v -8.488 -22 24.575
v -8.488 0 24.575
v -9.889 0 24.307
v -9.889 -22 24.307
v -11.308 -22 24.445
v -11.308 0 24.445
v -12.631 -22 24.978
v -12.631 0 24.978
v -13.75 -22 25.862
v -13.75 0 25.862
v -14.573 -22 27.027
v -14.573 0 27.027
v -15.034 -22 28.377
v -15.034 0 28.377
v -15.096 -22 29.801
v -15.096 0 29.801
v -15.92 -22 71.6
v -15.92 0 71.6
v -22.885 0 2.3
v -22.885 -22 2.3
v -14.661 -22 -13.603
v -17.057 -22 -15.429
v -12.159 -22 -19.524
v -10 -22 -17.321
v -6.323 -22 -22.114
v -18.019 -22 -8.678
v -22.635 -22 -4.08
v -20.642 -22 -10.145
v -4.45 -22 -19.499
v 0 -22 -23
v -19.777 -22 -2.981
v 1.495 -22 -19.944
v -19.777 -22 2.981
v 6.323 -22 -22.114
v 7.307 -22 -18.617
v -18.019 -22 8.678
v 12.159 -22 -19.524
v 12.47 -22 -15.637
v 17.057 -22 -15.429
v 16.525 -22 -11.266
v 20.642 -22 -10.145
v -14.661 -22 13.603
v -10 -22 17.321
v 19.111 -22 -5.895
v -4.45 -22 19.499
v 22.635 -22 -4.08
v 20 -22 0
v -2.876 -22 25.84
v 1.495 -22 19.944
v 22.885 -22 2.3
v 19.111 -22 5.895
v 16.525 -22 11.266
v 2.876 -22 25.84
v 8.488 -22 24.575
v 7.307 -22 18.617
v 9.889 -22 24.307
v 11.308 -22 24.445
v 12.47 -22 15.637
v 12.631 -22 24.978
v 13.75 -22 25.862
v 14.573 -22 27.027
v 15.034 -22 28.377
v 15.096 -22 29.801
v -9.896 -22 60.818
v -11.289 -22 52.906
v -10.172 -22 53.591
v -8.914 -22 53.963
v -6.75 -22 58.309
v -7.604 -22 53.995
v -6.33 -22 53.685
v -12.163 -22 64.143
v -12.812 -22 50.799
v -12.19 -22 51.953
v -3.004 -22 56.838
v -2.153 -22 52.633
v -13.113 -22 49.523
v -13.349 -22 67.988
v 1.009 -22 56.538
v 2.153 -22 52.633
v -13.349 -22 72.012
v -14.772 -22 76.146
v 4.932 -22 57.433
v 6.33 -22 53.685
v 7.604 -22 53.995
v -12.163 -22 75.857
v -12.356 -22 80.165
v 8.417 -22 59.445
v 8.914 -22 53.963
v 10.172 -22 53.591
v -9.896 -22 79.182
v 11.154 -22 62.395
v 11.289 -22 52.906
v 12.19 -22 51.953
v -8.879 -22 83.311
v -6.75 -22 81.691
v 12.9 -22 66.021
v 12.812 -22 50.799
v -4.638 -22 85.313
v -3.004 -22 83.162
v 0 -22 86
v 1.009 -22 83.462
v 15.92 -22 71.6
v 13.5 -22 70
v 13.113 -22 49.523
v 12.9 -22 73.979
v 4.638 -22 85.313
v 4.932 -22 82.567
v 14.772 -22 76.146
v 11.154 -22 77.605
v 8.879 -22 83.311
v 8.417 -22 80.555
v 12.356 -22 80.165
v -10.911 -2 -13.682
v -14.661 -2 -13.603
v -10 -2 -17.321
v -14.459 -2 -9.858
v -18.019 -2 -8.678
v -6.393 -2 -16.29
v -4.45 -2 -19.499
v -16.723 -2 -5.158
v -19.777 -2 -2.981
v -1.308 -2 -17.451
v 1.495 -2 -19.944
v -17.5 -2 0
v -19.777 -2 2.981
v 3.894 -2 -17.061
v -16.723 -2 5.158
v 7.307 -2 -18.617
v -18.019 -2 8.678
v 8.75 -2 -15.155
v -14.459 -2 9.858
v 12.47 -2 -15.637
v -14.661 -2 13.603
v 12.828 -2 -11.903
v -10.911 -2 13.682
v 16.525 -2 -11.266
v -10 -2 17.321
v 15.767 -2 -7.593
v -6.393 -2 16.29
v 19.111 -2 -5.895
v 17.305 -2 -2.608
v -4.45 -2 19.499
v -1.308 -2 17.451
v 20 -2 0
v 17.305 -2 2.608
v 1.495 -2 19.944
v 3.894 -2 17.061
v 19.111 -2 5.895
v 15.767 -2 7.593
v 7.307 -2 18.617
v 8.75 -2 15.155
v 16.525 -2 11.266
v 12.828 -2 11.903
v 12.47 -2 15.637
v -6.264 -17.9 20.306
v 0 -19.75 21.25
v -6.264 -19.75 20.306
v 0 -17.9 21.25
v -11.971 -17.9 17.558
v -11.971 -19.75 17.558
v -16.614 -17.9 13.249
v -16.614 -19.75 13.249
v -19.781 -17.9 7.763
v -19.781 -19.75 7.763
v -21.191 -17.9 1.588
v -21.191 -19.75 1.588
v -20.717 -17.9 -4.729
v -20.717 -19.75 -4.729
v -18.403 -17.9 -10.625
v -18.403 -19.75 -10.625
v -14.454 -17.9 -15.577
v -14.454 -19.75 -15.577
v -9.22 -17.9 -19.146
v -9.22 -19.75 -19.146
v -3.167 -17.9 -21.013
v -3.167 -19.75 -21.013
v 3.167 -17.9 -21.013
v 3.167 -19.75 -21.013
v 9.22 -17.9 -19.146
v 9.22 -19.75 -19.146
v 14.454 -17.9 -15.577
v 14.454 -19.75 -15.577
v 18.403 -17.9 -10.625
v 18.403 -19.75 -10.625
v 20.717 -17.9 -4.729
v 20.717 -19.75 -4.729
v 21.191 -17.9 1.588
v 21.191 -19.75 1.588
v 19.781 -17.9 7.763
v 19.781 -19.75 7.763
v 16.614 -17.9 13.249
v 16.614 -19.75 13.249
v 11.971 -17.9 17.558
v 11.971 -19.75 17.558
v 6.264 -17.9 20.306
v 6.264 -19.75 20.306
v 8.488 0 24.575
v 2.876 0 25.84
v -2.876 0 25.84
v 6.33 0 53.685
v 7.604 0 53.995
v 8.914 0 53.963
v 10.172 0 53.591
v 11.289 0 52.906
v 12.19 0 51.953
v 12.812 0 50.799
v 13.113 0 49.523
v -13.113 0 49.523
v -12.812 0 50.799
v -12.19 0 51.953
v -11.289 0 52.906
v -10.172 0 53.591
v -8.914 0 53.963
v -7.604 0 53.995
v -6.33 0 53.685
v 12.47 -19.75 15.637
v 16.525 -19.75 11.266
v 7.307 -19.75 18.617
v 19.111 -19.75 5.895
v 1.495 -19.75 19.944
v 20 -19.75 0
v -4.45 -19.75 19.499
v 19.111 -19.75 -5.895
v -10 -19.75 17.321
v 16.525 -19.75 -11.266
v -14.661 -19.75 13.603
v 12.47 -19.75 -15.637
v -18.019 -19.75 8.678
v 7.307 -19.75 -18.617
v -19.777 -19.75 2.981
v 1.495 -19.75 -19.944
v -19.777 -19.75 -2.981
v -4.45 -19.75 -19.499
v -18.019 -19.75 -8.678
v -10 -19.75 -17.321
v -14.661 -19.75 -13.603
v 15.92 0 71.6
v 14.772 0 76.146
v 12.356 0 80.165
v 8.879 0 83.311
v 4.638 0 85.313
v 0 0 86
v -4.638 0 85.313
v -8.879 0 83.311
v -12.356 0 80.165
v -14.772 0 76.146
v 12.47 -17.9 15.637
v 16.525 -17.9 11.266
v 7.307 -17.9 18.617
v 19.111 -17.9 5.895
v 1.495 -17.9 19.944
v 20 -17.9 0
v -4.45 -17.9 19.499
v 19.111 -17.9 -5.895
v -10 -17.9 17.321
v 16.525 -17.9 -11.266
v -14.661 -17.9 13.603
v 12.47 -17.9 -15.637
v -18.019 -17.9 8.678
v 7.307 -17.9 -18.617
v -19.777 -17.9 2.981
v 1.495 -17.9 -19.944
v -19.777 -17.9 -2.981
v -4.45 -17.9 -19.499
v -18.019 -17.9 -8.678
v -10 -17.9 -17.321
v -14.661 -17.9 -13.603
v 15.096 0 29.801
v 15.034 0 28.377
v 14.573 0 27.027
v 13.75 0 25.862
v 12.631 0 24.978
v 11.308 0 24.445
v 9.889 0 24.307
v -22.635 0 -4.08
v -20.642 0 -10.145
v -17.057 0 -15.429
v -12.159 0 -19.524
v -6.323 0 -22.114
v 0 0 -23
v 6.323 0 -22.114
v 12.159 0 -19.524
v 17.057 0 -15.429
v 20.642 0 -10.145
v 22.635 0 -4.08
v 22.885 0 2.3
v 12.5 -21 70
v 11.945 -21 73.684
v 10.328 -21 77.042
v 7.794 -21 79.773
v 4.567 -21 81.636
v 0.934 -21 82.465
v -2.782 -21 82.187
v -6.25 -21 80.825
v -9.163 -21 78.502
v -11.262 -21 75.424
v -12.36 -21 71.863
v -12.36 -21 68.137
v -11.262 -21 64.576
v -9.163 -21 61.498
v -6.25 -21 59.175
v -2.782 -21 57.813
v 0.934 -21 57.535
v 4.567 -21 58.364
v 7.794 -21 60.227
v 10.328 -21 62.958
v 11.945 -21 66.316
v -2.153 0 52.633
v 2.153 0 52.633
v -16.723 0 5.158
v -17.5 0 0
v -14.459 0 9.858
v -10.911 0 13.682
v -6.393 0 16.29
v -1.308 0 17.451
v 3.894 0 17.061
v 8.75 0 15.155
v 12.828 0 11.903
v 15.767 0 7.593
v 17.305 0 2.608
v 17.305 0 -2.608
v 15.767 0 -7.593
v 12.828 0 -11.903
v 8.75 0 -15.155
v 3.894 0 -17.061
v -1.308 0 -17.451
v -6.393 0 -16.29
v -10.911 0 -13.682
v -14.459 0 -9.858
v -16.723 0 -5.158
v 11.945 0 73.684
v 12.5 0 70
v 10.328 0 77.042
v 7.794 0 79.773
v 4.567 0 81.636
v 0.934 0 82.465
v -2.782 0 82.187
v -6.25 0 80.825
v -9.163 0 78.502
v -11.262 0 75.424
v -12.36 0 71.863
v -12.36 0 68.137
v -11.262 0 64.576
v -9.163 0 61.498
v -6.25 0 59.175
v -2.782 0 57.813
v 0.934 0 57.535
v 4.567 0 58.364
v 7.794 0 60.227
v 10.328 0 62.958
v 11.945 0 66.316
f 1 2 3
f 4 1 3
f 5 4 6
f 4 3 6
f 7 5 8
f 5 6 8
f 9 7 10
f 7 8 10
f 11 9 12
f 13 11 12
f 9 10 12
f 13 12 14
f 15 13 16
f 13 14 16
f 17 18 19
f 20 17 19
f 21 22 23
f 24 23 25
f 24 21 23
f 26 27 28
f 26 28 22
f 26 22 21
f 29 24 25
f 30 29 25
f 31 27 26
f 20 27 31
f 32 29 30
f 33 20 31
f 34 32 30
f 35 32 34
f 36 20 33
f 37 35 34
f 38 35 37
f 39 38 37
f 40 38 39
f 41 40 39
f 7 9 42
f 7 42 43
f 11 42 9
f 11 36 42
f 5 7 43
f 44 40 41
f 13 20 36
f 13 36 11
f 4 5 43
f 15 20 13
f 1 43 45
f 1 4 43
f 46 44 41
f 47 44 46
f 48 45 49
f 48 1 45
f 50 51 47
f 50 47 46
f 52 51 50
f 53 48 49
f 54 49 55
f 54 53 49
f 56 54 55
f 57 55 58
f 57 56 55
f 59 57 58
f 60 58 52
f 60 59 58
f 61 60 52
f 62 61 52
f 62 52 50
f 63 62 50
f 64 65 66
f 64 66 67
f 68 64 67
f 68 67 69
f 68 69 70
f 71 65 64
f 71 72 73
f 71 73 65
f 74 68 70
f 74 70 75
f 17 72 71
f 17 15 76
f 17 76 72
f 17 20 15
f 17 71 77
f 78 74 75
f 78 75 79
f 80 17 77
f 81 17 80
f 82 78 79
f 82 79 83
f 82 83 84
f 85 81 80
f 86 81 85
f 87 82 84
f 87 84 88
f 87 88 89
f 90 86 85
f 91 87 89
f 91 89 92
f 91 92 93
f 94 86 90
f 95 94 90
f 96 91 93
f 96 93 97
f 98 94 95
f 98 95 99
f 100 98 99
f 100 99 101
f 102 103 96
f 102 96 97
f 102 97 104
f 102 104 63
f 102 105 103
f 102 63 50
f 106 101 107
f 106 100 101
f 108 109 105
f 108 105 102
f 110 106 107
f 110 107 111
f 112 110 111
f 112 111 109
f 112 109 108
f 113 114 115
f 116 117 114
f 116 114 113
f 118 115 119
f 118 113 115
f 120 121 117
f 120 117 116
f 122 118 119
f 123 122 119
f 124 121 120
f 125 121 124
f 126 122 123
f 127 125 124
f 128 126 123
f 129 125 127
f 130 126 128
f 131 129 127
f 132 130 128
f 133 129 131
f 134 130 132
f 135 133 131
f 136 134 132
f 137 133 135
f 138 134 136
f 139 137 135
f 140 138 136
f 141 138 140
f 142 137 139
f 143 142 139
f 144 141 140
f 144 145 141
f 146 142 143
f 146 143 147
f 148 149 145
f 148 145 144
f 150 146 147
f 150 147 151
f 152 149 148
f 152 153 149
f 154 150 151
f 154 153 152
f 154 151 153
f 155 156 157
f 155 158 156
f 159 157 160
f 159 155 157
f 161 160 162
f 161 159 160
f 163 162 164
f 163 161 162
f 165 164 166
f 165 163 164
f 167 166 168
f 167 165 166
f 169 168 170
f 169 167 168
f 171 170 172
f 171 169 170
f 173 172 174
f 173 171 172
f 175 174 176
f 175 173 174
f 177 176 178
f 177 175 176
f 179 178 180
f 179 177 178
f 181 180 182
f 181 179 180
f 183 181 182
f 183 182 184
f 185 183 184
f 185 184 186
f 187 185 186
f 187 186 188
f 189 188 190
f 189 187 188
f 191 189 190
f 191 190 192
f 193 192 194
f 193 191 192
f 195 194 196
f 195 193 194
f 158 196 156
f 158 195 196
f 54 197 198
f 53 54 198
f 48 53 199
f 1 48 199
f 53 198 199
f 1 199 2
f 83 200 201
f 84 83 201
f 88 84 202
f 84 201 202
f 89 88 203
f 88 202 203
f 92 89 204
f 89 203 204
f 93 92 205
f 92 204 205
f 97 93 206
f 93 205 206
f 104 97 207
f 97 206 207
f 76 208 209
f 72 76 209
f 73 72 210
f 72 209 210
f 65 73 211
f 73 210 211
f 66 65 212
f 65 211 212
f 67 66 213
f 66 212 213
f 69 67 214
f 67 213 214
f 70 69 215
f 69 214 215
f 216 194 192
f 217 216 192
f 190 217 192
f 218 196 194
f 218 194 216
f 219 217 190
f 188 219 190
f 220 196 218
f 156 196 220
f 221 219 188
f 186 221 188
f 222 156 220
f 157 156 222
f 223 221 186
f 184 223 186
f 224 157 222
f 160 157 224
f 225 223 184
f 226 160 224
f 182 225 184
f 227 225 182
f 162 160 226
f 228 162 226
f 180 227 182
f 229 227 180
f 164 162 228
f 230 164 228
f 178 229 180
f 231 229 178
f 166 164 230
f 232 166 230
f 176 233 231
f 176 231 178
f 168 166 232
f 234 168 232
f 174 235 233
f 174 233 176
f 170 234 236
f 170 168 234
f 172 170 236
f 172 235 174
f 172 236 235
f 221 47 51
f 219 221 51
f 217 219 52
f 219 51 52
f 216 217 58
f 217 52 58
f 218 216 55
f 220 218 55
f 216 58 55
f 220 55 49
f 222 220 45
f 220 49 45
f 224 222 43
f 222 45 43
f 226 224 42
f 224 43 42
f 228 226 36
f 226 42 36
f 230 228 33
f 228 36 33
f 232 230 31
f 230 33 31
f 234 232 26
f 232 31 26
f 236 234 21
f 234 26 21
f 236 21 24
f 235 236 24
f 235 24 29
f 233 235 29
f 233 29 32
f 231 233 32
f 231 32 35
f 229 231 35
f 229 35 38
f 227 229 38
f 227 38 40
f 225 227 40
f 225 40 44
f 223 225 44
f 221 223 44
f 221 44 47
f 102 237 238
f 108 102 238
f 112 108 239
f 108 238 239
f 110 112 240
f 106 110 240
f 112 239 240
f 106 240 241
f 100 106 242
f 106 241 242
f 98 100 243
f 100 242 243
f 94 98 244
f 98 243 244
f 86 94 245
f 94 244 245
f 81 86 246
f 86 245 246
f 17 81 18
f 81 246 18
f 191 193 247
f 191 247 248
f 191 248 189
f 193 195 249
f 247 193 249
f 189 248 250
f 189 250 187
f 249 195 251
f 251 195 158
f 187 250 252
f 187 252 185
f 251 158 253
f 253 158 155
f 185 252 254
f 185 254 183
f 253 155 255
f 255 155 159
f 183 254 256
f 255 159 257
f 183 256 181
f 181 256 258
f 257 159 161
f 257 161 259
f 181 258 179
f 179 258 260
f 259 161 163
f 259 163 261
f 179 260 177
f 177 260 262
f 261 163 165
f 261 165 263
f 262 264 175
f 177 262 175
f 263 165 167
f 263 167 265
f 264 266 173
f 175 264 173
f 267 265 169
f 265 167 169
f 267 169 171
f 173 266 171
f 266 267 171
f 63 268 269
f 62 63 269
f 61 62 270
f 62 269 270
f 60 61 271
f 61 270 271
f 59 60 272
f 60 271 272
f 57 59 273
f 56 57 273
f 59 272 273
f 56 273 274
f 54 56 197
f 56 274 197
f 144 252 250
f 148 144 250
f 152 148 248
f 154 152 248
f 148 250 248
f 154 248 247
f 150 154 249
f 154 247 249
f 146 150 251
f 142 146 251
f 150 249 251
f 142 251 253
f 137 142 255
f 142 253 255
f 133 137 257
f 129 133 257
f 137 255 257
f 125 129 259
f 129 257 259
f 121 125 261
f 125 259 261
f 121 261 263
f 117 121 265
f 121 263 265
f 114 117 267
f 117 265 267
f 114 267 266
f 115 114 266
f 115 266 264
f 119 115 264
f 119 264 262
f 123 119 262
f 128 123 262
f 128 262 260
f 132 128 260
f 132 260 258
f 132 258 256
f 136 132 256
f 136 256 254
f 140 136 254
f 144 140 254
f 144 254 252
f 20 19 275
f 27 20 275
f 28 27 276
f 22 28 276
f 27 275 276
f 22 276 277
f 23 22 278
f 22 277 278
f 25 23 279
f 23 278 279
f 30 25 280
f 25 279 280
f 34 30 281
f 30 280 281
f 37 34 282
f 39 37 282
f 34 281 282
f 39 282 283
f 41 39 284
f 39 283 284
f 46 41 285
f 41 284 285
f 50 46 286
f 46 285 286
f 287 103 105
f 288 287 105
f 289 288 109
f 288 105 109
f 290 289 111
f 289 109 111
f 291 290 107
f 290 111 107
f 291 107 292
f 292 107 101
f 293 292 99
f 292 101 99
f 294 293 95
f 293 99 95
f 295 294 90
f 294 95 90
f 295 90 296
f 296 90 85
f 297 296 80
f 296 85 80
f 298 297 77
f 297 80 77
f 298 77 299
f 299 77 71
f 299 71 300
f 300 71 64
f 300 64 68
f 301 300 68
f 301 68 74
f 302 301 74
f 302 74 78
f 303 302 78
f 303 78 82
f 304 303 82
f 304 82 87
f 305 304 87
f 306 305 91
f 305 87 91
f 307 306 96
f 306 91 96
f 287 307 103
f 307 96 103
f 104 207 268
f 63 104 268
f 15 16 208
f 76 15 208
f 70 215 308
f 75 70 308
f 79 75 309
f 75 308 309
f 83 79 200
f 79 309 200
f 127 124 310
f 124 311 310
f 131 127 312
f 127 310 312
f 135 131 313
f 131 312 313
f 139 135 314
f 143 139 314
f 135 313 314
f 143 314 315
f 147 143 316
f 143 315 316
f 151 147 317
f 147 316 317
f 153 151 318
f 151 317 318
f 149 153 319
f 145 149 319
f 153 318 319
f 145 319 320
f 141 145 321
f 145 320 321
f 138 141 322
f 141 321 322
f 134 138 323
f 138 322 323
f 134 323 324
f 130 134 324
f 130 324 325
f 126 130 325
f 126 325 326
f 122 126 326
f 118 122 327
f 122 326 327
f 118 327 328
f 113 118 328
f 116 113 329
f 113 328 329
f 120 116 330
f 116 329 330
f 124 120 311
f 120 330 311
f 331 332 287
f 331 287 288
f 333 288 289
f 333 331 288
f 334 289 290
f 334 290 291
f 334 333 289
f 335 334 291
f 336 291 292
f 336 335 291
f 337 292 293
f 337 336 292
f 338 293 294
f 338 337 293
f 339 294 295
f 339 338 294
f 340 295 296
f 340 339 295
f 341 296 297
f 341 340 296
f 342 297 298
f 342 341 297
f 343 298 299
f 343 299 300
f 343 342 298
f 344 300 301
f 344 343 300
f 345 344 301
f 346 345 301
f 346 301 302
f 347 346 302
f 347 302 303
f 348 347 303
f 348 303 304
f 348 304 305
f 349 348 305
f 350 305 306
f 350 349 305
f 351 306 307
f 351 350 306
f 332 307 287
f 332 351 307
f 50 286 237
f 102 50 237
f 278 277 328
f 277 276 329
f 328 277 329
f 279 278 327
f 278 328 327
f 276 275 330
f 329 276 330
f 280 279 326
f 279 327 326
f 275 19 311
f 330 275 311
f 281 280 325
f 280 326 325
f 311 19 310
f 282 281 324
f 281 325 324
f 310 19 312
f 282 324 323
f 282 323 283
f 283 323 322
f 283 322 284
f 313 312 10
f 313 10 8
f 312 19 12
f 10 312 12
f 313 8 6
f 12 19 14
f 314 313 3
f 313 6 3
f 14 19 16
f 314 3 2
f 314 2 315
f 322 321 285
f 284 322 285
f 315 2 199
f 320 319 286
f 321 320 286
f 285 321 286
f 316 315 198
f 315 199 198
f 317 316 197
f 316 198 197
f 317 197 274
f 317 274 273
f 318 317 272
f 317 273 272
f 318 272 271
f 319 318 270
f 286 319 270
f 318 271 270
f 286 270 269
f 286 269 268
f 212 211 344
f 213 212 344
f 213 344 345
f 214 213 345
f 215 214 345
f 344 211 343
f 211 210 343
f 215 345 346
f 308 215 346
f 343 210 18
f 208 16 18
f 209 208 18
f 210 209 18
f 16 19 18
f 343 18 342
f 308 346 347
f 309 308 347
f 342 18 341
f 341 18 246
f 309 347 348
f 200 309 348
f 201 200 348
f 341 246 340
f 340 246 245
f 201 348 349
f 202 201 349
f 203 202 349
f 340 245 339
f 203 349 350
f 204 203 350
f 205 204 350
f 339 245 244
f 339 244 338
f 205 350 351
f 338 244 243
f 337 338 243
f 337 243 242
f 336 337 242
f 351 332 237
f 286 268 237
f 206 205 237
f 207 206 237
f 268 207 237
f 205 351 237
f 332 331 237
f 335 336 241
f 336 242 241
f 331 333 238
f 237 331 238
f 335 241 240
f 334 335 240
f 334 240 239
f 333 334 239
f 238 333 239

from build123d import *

# Parameters (mm, degrees)
F0_R           = 12.5
F1_DEPTH       = 22
F2_SIZE        = 1
F4_D           = 35
F4_CBORE_D     = 40
F4_CBORE_DEPTH = 20
F5_W           = 1.85
F5_H           = 21.25


with BuildPart() as f1:
    # F0 (on Front) → F1 (new body)
    with BuildSketch(Plane.XZ):
        with BuildLine():
            Line((-15.919799, 71.6), (-22.884711, 2.3))
            ThreePointArc((-22.884711, 2.3), (0, -23), (22.884711, 2.3))
            Line((22.884711, 2.3), (15.919799, 71.6))
            ThreePointArc((15.919799, 71.6), (0, 86), (-15.919799, 71.6))
        make_face()
        with BuildLine():
            ThreePointArc((-13.113387, 49.52345), (-10.753012, 53.285382), (-6.329905, 53.684906))
            ThreePointArc((-6.329905, 53.684906), (0, 52.5), (6.329905, 53.684906))
            ThreePointArc((6.329905, 53.684906), (10.753012, 53.285382), (13.113387, 49.52345))
            Line((13.113387, 49.52345), (15.095524, 29.801429))
            ThreePointArc((15.095524, 29.801429), (13.222374, 25.379832), (8.488234, 24.575392))
            ThreePointArc((8.488234, 24.575392), (0, 26), (-8.488234, 24.575392))
            ThreePointArc((-8.488234, 24.575392), (-13.222374, 25.379832), (-15.095524, 29.801429))
            Line((-15.095524, 29.801429), (-13.113387, 49.52345))
        make_face(mode=Mode.SUBTRACT)
        with Locations((0, 70)):
            Circle(F0_R, mode=Mode.SUBTRACT)
    extrude(amount=F1_DEPTH)

    # F2
    f2_edges = [f1.edges().sort_by_distance(p)[0] for p in [
        (-12.5, -22, 70),
    ]]
    chamfer(f2_edges, length=F2_SIZE)

    # F4 (through all)
    with Locations(Plane.XZ.offset(22)):
        with Locations((0, 0)):
            CounterBoreHole(F4_D / 2, F4_CBORE_D / 2, F4_CBORE_DEPTH)

    # F5 (on Right) → F6 (revolve, cut)
    with BuildSketch(Plane.YZ):
        with Locations((-18.825, 10.625)):
            Rectangle(F5_W, F5_H)
    revolve(axis=Axis((0, -18.825, 0), (0, -1, 0)), mode=Mode.SUBTRACT)


solid = f1.part
